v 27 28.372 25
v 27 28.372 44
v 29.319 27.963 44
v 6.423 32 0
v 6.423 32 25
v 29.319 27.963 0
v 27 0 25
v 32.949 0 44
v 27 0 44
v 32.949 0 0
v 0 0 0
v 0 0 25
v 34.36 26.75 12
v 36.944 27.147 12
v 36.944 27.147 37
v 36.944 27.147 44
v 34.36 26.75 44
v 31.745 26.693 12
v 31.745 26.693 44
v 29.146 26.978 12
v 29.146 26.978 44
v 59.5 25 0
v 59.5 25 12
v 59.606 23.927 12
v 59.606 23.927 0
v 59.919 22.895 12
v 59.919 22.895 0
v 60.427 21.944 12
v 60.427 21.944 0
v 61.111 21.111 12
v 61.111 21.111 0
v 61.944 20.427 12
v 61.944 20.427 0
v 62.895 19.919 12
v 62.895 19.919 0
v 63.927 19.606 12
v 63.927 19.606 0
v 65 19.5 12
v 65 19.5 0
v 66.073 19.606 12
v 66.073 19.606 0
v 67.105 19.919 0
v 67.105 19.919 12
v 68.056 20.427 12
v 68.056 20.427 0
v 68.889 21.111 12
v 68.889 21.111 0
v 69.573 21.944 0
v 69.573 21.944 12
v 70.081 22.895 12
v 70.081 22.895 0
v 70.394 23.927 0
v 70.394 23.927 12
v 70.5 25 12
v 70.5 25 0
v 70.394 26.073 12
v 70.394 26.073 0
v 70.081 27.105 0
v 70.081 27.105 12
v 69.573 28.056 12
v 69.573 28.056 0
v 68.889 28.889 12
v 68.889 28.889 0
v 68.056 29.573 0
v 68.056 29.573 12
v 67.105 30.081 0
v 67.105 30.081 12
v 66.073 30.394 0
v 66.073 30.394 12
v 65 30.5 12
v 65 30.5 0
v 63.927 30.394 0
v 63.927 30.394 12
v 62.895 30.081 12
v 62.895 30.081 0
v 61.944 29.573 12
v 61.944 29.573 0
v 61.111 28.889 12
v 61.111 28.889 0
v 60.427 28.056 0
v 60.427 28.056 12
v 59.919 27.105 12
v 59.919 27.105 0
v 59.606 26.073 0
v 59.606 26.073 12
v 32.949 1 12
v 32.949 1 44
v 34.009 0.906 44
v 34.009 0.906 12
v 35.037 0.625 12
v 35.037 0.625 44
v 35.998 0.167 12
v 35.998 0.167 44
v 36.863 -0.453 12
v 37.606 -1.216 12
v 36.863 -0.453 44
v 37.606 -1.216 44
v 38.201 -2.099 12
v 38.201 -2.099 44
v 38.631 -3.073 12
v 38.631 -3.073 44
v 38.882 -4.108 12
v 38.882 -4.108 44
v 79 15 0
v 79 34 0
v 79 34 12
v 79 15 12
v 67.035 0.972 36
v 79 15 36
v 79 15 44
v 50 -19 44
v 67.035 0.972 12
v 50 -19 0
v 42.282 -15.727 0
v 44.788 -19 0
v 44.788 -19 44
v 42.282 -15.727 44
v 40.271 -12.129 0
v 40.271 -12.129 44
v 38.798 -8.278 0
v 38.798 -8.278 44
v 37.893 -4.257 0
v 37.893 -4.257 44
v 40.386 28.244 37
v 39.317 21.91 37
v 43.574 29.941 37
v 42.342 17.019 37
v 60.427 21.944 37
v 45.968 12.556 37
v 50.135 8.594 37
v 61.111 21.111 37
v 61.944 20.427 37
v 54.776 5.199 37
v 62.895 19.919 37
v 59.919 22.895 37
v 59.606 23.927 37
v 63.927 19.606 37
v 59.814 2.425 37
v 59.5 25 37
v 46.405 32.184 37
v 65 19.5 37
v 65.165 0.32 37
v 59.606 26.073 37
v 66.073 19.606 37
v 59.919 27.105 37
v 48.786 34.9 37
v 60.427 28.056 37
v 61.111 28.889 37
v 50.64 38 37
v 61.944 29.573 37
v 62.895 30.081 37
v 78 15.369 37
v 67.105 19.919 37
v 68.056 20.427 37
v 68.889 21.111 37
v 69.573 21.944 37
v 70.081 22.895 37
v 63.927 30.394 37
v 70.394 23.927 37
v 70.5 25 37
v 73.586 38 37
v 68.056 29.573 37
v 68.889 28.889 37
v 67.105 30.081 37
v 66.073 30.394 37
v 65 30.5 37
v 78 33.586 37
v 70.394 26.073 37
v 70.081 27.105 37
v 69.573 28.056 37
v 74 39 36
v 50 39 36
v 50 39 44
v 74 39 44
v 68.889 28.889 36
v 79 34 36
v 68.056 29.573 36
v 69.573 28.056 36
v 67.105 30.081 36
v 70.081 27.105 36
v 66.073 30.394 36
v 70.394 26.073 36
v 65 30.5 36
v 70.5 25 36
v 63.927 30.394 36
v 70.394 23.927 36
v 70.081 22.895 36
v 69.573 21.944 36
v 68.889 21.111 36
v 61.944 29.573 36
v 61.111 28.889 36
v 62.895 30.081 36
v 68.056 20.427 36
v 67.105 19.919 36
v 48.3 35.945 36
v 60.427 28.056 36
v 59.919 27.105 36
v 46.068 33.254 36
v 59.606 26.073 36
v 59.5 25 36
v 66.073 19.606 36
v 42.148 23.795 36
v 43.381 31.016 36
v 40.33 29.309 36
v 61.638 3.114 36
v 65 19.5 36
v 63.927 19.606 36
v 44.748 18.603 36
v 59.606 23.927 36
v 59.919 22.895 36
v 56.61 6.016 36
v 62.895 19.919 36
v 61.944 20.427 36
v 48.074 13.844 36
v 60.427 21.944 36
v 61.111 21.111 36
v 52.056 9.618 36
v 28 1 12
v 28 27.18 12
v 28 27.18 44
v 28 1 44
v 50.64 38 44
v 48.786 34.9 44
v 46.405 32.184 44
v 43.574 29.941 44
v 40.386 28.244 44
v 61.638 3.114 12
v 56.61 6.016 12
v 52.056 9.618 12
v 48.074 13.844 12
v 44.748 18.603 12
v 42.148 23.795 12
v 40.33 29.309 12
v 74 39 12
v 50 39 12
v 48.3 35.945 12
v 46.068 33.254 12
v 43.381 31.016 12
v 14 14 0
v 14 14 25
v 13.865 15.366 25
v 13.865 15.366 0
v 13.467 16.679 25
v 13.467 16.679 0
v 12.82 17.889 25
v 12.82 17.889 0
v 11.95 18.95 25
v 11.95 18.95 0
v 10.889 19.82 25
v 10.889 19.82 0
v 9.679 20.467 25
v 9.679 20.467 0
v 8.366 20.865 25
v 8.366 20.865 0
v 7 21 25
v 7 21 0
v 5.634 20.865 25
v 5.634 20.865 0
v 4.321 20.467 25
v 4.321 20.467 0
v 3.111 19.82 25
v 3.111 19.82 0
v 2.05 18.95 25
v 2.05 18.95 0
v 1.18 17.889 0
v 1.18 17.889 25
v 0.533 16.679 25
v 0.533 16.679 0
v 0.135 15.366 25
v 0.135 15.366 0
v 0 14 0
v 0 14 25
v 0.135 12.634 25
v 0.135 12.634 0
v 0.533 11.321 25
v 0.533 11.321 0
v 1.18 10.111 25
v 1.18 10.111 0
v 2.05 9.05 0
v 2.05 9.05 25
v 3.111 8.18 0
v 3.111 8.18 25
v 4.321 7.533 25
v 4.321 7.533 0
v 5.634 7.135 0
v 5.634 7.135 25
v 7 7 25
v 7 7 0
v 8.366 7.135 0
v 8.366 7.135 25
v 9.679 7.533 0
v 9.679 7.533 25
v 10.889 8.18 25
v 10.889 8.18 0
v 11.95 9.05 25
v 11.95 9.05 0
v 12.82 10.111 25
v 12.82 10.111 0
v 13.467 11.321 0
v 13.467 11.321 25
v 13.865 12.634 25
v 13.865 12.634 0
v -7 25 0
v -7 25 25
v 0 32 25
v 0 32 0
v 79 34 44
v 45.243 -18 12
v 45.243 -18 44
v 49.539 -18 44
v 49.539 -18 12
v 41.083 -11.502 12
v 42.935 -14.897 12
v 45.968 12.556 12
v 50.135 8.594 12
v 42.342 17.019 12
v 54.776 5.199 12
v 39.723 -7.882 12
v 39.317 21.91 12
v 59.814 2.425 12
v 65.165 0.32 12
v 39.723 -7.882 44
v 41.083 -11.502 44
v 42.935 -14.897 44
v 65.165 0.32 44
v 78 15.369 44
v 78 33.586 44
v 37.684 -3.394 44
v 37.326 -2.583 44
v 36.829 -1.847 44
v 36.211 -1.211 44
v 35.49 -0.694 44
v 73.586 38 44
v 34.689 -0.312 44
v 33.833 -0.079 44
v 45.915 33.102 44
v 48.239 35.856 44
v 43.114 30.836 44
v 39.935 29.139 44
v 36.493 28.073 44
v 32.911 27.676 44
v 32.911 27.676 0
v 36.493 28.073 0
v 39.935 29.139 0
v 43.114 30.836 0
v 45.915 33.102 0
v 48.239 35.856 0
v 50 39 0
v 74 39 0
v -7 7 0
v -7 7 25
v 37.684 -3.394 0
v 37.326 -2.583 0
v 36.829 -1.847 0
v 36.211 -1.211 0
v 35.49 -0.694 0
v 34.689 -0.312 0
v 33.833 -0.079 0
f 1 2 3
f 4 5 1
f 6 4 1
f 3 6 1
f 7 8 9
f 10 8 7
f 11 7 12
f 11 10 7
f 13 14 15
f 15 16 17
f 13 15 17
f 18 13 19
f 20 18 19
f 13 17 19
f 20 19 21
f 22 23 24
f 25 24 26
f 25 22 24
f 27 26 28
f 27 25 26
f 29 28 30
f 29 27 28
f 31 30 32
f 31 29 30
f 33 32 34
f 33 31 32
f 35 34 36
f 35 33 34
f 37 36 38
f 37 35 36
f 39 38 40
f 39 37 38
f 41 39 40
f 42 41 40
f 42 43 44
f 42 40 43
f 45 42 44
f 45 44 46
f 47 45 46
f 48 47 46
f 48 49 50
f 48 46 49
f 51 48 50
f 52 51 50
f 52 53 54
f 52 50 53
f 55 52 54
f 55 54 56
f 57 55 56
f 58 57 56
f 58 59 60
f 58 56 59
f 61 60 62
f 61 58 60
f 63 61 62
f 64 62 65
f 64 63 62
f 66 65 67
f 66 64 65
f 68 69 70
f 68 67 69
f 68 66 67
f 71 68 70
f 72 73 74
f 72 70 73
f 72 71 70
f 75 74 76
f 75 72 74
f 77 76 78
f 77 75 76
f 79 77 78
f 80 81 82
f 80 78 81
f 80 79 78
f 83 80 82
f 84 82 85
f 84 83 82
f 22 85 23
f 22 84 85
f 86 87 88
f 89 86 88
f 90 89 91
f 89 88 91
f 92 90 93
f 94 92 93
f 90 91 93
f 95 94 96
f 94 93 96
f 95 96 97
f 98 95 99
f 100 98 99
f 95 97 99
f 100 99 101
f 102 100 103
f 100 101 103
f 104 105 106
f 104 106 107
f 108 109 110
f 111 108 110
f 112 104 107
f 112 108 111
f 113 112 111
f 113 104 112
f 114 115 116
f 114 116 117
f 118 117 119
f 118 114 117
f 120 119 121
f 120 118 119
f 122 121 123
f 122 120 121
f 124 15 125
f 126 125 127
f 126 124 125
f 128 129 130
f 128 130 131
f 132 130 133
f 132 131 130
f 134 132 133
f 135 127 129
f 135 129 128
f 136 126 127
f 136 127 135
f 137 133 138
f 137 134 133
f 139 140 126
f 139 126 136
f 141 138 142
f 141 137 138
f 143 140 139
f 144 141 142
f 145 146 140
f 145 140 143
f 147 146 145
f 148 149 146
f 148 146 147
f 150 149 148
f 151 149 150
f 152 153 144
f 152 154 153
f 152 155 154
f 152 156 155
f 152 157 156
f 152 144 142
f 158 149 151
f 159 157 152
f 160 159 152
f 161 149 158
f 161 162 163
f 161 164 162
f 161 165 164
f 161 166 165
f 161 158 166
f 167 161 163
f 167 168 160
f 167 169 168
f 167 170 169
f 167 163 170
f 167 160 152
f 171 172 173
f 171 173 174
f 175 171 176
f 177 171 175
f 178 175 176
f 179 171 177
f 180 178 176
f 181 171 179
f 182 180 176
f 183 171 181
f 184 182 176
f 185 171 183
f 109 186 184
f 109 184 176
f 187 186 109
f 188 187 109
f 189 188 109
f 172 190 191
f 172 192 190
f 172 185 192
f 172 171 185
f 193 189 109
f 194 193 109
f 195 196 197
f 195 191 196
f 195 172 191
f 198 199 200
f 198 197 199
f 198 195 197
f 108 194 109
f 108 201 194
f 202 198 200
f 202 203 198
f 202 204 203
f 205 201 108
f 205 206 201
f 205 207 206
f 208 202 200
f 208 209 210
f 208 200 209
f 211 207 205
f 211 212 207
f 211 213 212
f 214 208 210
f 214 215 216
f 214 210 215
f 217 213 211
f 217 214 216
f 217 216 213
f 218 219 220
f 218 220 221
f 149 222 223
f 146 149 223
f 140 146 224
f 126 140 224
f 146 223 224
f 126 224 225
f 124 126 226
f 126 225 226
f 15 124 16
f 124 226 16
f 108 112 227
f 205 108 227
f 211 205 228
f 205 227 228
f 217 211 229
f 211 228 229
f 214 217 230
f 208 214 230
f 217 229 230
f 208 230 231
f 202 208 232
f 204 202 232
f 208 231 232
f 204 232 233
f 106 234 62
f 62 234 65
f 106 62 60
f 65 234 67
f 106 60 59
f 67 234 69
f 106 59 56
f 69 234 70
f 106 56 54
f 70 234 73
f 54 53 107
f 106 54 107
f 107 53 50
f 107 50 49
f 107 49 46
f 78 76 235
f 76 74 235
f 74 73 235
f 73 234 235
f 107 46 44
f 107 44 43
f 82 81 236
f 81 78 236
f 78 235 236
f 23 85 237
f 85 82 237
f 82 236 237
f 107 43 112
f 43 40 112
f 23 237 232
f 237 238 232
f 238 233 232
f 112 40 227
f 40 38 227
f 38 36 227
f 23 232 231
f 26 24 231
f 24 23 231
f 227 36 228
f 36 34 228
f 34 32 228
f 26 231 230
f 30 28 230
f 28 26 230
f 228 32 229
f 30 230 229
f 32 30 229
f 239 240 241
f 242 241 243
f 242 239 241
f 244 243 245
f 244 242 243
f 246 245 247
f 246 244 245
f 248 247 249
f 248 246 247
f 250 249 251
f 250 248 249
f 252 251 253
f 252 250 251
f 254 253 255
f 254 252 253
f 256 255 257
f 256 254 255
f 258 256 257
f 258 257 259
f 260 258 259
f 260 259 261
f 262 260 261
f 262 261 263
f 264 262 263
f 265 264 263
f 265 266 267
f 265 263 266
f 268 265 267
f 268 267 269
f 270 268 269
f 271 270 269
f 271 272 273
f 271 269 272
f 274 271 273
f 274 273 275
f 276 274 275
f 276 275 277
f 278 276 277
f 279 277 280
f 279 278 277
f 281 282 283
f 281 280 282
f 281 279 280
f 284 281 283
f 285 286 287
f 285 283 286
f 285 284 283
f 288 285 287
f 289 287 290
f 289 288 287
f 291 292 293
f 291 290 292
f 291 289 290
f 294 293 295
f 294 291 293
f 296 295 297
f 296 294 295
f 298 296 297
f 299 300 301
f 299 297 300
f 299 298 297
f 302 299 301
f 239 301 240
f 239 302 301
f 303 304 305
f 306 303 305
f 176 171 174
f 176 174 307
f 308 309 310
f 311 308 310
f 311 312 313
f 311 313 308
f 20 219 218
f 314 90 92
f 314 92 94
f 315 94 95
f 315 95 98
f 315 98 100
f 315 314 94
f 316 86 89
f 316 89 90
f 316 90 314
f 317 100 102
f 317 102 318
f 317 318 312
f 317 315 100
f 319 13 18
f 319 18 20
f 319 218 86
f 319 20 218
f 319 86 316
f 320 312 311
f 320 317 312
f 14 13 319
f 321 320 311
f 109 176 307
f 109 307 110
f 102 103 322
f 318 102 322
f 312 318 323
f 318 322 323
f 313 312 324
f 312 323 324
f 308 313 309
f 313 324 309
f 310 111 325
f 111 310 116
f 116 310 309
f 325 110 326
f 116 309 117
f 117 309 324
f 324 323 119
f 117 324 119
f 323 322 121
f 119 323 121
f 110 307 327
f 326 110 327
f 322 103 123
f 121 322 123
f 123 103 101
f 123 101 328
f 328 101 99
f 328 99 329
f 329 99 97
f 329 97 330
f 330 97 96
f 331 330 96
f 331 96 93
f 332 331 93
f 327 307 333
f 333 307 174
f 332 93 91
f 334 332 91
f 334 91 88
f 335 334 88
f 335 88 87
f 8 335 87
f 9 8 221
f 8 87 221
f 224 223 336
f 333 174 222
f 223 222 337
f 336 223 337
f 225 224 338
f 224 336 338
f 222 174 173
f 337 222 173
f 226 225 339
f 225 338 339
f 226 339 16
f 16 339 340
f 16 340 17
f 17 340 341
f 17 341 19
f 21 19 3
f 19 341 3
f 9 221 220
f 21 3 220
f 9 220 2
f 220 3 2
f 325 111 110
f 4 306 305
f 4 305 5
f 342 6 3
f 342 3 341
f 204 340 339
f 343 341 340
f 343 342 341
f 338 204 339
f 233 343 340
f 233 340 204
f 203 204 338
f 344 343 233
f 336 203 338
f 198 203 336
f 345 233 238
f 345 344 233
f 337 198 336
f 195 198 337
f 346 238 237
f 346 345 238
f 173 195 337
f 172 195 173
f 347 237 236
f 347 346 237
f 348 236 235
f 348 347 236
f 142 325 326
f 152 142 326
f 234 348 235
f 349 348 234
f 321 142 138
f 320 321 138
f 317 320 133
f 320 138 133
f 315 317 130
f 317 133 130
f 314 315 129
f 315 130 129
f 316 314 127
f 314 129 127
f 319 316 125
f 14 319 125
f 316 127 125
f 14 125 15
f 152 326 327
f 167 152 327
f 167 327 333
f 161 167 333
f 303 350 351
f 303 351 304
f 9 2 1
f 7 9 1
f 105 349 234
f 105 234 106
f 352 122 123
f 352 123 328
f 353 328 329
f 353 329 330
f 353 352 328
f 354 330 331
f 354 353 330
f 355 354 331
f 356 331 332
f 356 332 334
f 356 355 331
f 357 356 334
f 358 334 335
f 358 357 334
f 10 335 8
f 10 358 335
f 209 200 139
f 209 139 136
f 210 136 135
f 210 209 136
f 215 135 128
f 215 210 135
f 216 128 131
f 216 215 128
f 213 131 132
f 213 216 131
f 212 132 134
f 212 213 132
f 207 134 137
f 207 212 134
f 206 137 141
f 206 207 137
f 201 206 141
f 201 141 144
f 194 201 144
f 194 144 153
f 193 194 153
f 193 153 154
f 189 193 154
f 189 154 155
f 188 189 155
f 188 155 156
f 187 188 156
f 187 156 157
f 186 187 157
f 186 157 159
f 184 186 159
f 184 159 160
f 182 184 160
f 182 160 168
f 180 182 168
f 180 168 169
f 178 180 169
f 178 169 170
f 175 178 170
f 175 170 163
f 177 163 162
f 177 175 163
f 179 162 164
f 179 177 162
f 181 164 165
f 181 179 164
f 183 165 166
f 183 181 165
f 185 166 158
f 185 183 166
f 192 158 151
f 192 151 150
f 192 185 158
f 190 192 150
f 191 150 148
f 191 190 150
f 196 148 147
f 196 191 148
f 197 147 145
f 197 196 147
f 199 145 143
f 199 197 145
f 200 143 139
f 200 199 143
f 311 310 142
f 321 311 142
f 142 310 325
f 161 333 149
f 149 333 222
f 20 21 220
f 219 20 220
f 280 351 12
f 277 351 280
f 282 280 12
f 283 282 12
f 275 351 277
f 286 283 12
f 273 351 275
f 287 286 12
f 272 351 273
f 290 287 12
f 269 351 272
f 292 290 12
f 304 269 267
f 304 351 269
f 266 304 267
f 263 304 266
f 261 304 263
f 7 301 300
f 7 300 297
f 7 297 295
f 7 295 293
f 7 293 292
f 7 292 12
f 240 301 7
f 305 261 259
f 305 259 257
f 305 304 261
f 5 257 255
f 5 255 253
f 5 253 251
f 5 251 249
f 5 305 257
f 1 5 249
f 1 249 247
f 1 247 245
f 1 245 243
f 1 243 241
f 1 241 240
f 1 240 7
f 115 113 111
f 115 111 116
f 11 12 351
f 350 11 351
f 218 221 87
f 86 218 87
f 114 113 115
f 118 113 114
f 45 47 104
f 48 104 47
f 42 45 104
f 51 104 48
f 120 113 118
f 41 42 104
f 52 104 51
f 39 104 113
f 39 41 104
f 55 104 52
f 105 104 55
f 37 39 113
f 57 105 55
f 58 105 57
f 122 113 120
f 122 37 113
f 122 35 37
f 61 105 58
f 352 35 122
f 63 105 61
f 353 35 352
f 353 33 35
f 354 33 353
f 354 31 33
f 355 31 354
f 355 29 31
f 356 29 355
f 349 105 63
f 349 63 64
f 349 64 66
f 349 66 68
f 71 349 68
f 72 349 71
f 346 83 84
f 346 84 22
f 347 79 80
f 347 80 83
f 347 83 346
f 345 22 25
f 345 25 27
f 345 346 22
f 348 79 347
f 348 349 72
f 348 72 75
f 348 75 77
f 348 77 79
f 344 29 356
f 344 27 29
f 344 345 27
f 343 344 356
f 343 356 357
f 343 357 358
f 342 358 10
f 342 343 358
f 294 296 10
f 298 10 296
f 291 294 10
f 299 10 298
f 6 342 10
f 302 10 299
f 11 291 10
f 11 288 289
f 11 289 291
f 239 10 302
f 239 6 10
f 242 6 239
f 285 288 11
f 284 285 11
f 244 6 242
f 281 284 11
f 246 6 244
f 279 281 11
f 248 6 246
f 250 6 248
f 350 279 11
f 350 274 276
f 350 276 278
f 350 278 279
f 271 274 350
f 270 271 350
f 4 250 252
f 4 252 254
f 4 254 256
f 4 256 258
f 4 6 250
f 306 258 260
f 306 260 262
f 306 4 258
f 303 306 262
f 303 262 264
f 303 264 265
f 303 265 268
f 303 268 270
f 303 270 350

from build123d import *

# Parameters (mm, degrees)
SKETCH1_R           = 7
BOSS_EXTRUDE1_DEPTH = 44
SKETCH70_W          = 24
SKETCH70_H          = 39.86554544
SKETCH71_W          = 34
SKETCH71_H          = 19
CUT_EXTRUDE1_DEPTH  = 43
SKETCH73_R          = 5.5
CUT_EXTRUDE3_DEPTH  = 99.478424033
CUT_EXTRUDE4_DEPTH  = 32
SKETCH78_14_R       = 5.5
CUT_EXTRUDE5_DEPTH  = 7


with BuildPart() as part:
    # Sketch1 → Boss-Extrude1 (new body)
    with BuildSketch(Plane.XY):
        with BuildLine():
            Line((0, 0), (-7, 7))
            Line((-7, 7), (-7, 25))
            Line((-7, 25), (0, 32))
            Line((0, 32), (6.423127039, 32))
            Line((6.423127039, 32), (29.319429923, 27.962764043))
            ThreePointArc((29.319429923, 27.962764043), (41.564716358, 29.911963462), (50, 39))
            Line((50, 39), (74, 39))
            Line((74, 39), (79, 34))
            Line((79, 34), (79, 15))
            Line((79, 15), (50, -19))
            Line((50, -19), (44.788067397, -19))
            ThreePointArc((44.788067397, -19), (40.27095427, -12.128573817), (37.89327269, -4.256633834))
            ThreePointArc((37.89327269, -4.256633834), (36.210984968, -1.21075002), (32.948840798, 0))
            Line((32.948840798, 0), (0, 0))
        make_face()
        with Locations((7, 14)):
            Circle(SKETCH1_R, mode=Mode.SUBTRACT)
    extrude(amount=BOSS_EXTRUDE1_DEPTH)

    # Sketch70 → Cut-Revolve3 (revolve, cut)
    with BuildSketch(Plane(origin=(79, 0, 0), x_dir=(0, 0, -1), z_dir=(1, 0, 0))):
        with Locations((-24, 19.06722728)):
            Rectangle(SKETCH70_W, SKETCH70_H)
    revolve(axis=Axis((79, 39, 36), (0, 0, -1)), mode=Mode.SUBTRACT)

    # Sketch71 → Cut-Extrude1 (cut)
    with BuildSketch(Plane(origin=(0, 39, 0), x_dir=(1, 0, 0), z_dir=(0, 1, 0))):
        with Locations((10, -34.5)):
            Rectangle(SKETCH71_W, SKETCH71_H)
    extrude(amount=-CUT_EXTRUDE1_DEPTH, mode=Mode.SUBTRACT)

    # Sketch73 → Cut-Extrude3 (cut, through all)
    with BuildSketch(Plane.XY):
        with Locations((65, 25)):
            Circle(SKETCH73_R)
    extrude(amount=CUT_EXTRUDE3_DEPTH, mode=Mode.SUBTRACT)

    # Sketch78 → Cut-Extrude4 (cut)
    with BuildSketch(Plane.XY.offset(44)):
        with BuildLine():
            ThreePointArc((36.944123049, 27.147434538), (33.053294732, 26.678832738), (29.145781746, 26.97795629))
            Line((29.145781746, 26.97795629), (28, 27.179988526))
            Line((28, 27.179988526), (28, 1))
            Line((28, 1), (32.948840798, 1))
            ThreePointArc((32.948840798, 1), (36.863413802, -0.452900023), (38.882159069, -4.107960601))
            ThreePointArc((38.882159069, -4.107960601), (41.083042895, -11.502353322), (45.242552598, -18))
            Line((45.242552598, -18), (49.538593943, -18))
            Line((49.538593943, -18), (65.164712554, 0.320276992))
            ThreePointArc((65.164712554, 0.320276992), (47.987855004, 10.508012336), (36.944123049, 27.147434538))
        make_face()
    extrude(amount=-CUT_EXTRUDE4_DEPTH, mode=Mode.SUBTRACT)

    # Sketch78<14> → Cut-Extrude5 (cut)
    with BuildSketch(Plane.XY.offset(44)):
        with BuildLine():
            ThreePointArc((50.639838281, 38), (45.039926113, 30.998835685), (36.944123049, 27.147434538))
            ThreePointArc((36.944123049, 27.147434538), (47.987855004, 10.508012336), (65.164712554, 0.320276992))
            Line((65.164712554, 0.320276992), (78, 15.368545033))
            Line((78, 15.368545033), (78, 33.585786438))
            Line((78, 33.585786438), (73.585786438, 38))
            Line((73.585786438, 38), (50.639838281, 38))
        make_face()
        with Locations((65, 25)):
            Circle(SKETCH78_14_R, mode=Mode.SUBTRACT)
    extrude(amount=-CUT_EXTRUDE5_DEPTH, mode=Mode.SUBTRACT)


solid = part.part
